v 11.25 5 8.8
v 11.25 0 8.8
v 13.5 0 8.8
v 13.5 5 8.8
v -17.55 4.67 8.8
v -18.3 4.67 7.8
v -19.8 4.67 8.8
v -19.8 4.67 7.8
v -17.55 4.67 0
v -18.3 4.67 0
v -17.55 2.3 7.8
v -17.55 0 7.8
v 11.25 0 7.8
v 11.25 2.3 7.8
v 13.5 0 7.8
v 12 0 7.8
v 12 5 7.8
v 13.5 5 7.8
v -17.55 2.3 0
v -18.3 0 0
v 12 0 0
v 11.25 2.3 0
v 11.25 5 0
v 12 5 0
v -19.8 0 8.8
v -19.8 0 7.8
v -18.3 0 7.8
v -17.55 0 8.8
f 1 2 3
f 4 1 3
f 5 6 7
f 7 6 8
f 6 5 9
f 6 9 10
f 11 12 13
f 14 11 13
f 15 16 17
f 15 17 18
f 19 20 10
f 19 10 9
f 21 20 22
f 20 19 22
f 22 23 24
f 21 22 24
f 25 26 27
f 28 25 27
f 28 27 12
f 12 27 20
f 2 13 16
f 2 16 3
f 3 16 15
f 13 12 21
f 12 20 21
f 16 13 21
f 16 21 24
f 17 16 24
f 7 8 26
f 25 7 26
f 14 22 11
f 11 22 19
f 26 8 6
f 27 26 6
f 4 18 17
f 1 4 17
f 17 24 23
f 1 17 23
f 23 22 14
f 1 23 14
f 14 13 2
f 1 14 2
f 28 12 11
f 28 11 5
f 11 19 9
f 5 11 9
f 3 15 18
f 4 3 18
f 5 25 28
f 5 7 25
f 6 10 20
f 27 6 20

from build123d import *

# Parameters (mm, degrees)
F1_DEPTH = 7.8
F3_DEPTH = 1
F4_W     = 28.8
F4_H     = 1
F5_DEPTH = 5.001


with BuildPart() as f1:
    # F0 (on Top) → F1 (new body)
    with BuildSketch(Plane.XY):
        Polygon((-18.3, 4.669697), (-18.3, 0), (12, 0), (12, 5), (11.25, 5), (11.25, 2.3), (-17.55, 2.3), (-17.55, 4.669697), align=None)
    extrude(amount=F1_DEPTH)

    # F2 (on face) → F3 (join)
    with BuildSketch(Plane.XY.offset(7.8)):
        Polygon((-17.55, 2.3), (-17.55, 4.669697), (-19.8, 4.669697), (-19.8, 0), (13.5, 0), (13.5, 5), (11.25, 5), (11.25, 2.3), align=None)
    extrude(amount=F3_DEPTH)

    # F4 (on face) → F5 (cut, through all)
    with BuildSketch(Plane.XZ):
        with Locations((-3.15, 8.3)):
            Rectangle(F4_W, F4_H)
    extrude(amount=-F5_DEPTH, mode=Mode.SUBTRACT)


solid = f1.part
